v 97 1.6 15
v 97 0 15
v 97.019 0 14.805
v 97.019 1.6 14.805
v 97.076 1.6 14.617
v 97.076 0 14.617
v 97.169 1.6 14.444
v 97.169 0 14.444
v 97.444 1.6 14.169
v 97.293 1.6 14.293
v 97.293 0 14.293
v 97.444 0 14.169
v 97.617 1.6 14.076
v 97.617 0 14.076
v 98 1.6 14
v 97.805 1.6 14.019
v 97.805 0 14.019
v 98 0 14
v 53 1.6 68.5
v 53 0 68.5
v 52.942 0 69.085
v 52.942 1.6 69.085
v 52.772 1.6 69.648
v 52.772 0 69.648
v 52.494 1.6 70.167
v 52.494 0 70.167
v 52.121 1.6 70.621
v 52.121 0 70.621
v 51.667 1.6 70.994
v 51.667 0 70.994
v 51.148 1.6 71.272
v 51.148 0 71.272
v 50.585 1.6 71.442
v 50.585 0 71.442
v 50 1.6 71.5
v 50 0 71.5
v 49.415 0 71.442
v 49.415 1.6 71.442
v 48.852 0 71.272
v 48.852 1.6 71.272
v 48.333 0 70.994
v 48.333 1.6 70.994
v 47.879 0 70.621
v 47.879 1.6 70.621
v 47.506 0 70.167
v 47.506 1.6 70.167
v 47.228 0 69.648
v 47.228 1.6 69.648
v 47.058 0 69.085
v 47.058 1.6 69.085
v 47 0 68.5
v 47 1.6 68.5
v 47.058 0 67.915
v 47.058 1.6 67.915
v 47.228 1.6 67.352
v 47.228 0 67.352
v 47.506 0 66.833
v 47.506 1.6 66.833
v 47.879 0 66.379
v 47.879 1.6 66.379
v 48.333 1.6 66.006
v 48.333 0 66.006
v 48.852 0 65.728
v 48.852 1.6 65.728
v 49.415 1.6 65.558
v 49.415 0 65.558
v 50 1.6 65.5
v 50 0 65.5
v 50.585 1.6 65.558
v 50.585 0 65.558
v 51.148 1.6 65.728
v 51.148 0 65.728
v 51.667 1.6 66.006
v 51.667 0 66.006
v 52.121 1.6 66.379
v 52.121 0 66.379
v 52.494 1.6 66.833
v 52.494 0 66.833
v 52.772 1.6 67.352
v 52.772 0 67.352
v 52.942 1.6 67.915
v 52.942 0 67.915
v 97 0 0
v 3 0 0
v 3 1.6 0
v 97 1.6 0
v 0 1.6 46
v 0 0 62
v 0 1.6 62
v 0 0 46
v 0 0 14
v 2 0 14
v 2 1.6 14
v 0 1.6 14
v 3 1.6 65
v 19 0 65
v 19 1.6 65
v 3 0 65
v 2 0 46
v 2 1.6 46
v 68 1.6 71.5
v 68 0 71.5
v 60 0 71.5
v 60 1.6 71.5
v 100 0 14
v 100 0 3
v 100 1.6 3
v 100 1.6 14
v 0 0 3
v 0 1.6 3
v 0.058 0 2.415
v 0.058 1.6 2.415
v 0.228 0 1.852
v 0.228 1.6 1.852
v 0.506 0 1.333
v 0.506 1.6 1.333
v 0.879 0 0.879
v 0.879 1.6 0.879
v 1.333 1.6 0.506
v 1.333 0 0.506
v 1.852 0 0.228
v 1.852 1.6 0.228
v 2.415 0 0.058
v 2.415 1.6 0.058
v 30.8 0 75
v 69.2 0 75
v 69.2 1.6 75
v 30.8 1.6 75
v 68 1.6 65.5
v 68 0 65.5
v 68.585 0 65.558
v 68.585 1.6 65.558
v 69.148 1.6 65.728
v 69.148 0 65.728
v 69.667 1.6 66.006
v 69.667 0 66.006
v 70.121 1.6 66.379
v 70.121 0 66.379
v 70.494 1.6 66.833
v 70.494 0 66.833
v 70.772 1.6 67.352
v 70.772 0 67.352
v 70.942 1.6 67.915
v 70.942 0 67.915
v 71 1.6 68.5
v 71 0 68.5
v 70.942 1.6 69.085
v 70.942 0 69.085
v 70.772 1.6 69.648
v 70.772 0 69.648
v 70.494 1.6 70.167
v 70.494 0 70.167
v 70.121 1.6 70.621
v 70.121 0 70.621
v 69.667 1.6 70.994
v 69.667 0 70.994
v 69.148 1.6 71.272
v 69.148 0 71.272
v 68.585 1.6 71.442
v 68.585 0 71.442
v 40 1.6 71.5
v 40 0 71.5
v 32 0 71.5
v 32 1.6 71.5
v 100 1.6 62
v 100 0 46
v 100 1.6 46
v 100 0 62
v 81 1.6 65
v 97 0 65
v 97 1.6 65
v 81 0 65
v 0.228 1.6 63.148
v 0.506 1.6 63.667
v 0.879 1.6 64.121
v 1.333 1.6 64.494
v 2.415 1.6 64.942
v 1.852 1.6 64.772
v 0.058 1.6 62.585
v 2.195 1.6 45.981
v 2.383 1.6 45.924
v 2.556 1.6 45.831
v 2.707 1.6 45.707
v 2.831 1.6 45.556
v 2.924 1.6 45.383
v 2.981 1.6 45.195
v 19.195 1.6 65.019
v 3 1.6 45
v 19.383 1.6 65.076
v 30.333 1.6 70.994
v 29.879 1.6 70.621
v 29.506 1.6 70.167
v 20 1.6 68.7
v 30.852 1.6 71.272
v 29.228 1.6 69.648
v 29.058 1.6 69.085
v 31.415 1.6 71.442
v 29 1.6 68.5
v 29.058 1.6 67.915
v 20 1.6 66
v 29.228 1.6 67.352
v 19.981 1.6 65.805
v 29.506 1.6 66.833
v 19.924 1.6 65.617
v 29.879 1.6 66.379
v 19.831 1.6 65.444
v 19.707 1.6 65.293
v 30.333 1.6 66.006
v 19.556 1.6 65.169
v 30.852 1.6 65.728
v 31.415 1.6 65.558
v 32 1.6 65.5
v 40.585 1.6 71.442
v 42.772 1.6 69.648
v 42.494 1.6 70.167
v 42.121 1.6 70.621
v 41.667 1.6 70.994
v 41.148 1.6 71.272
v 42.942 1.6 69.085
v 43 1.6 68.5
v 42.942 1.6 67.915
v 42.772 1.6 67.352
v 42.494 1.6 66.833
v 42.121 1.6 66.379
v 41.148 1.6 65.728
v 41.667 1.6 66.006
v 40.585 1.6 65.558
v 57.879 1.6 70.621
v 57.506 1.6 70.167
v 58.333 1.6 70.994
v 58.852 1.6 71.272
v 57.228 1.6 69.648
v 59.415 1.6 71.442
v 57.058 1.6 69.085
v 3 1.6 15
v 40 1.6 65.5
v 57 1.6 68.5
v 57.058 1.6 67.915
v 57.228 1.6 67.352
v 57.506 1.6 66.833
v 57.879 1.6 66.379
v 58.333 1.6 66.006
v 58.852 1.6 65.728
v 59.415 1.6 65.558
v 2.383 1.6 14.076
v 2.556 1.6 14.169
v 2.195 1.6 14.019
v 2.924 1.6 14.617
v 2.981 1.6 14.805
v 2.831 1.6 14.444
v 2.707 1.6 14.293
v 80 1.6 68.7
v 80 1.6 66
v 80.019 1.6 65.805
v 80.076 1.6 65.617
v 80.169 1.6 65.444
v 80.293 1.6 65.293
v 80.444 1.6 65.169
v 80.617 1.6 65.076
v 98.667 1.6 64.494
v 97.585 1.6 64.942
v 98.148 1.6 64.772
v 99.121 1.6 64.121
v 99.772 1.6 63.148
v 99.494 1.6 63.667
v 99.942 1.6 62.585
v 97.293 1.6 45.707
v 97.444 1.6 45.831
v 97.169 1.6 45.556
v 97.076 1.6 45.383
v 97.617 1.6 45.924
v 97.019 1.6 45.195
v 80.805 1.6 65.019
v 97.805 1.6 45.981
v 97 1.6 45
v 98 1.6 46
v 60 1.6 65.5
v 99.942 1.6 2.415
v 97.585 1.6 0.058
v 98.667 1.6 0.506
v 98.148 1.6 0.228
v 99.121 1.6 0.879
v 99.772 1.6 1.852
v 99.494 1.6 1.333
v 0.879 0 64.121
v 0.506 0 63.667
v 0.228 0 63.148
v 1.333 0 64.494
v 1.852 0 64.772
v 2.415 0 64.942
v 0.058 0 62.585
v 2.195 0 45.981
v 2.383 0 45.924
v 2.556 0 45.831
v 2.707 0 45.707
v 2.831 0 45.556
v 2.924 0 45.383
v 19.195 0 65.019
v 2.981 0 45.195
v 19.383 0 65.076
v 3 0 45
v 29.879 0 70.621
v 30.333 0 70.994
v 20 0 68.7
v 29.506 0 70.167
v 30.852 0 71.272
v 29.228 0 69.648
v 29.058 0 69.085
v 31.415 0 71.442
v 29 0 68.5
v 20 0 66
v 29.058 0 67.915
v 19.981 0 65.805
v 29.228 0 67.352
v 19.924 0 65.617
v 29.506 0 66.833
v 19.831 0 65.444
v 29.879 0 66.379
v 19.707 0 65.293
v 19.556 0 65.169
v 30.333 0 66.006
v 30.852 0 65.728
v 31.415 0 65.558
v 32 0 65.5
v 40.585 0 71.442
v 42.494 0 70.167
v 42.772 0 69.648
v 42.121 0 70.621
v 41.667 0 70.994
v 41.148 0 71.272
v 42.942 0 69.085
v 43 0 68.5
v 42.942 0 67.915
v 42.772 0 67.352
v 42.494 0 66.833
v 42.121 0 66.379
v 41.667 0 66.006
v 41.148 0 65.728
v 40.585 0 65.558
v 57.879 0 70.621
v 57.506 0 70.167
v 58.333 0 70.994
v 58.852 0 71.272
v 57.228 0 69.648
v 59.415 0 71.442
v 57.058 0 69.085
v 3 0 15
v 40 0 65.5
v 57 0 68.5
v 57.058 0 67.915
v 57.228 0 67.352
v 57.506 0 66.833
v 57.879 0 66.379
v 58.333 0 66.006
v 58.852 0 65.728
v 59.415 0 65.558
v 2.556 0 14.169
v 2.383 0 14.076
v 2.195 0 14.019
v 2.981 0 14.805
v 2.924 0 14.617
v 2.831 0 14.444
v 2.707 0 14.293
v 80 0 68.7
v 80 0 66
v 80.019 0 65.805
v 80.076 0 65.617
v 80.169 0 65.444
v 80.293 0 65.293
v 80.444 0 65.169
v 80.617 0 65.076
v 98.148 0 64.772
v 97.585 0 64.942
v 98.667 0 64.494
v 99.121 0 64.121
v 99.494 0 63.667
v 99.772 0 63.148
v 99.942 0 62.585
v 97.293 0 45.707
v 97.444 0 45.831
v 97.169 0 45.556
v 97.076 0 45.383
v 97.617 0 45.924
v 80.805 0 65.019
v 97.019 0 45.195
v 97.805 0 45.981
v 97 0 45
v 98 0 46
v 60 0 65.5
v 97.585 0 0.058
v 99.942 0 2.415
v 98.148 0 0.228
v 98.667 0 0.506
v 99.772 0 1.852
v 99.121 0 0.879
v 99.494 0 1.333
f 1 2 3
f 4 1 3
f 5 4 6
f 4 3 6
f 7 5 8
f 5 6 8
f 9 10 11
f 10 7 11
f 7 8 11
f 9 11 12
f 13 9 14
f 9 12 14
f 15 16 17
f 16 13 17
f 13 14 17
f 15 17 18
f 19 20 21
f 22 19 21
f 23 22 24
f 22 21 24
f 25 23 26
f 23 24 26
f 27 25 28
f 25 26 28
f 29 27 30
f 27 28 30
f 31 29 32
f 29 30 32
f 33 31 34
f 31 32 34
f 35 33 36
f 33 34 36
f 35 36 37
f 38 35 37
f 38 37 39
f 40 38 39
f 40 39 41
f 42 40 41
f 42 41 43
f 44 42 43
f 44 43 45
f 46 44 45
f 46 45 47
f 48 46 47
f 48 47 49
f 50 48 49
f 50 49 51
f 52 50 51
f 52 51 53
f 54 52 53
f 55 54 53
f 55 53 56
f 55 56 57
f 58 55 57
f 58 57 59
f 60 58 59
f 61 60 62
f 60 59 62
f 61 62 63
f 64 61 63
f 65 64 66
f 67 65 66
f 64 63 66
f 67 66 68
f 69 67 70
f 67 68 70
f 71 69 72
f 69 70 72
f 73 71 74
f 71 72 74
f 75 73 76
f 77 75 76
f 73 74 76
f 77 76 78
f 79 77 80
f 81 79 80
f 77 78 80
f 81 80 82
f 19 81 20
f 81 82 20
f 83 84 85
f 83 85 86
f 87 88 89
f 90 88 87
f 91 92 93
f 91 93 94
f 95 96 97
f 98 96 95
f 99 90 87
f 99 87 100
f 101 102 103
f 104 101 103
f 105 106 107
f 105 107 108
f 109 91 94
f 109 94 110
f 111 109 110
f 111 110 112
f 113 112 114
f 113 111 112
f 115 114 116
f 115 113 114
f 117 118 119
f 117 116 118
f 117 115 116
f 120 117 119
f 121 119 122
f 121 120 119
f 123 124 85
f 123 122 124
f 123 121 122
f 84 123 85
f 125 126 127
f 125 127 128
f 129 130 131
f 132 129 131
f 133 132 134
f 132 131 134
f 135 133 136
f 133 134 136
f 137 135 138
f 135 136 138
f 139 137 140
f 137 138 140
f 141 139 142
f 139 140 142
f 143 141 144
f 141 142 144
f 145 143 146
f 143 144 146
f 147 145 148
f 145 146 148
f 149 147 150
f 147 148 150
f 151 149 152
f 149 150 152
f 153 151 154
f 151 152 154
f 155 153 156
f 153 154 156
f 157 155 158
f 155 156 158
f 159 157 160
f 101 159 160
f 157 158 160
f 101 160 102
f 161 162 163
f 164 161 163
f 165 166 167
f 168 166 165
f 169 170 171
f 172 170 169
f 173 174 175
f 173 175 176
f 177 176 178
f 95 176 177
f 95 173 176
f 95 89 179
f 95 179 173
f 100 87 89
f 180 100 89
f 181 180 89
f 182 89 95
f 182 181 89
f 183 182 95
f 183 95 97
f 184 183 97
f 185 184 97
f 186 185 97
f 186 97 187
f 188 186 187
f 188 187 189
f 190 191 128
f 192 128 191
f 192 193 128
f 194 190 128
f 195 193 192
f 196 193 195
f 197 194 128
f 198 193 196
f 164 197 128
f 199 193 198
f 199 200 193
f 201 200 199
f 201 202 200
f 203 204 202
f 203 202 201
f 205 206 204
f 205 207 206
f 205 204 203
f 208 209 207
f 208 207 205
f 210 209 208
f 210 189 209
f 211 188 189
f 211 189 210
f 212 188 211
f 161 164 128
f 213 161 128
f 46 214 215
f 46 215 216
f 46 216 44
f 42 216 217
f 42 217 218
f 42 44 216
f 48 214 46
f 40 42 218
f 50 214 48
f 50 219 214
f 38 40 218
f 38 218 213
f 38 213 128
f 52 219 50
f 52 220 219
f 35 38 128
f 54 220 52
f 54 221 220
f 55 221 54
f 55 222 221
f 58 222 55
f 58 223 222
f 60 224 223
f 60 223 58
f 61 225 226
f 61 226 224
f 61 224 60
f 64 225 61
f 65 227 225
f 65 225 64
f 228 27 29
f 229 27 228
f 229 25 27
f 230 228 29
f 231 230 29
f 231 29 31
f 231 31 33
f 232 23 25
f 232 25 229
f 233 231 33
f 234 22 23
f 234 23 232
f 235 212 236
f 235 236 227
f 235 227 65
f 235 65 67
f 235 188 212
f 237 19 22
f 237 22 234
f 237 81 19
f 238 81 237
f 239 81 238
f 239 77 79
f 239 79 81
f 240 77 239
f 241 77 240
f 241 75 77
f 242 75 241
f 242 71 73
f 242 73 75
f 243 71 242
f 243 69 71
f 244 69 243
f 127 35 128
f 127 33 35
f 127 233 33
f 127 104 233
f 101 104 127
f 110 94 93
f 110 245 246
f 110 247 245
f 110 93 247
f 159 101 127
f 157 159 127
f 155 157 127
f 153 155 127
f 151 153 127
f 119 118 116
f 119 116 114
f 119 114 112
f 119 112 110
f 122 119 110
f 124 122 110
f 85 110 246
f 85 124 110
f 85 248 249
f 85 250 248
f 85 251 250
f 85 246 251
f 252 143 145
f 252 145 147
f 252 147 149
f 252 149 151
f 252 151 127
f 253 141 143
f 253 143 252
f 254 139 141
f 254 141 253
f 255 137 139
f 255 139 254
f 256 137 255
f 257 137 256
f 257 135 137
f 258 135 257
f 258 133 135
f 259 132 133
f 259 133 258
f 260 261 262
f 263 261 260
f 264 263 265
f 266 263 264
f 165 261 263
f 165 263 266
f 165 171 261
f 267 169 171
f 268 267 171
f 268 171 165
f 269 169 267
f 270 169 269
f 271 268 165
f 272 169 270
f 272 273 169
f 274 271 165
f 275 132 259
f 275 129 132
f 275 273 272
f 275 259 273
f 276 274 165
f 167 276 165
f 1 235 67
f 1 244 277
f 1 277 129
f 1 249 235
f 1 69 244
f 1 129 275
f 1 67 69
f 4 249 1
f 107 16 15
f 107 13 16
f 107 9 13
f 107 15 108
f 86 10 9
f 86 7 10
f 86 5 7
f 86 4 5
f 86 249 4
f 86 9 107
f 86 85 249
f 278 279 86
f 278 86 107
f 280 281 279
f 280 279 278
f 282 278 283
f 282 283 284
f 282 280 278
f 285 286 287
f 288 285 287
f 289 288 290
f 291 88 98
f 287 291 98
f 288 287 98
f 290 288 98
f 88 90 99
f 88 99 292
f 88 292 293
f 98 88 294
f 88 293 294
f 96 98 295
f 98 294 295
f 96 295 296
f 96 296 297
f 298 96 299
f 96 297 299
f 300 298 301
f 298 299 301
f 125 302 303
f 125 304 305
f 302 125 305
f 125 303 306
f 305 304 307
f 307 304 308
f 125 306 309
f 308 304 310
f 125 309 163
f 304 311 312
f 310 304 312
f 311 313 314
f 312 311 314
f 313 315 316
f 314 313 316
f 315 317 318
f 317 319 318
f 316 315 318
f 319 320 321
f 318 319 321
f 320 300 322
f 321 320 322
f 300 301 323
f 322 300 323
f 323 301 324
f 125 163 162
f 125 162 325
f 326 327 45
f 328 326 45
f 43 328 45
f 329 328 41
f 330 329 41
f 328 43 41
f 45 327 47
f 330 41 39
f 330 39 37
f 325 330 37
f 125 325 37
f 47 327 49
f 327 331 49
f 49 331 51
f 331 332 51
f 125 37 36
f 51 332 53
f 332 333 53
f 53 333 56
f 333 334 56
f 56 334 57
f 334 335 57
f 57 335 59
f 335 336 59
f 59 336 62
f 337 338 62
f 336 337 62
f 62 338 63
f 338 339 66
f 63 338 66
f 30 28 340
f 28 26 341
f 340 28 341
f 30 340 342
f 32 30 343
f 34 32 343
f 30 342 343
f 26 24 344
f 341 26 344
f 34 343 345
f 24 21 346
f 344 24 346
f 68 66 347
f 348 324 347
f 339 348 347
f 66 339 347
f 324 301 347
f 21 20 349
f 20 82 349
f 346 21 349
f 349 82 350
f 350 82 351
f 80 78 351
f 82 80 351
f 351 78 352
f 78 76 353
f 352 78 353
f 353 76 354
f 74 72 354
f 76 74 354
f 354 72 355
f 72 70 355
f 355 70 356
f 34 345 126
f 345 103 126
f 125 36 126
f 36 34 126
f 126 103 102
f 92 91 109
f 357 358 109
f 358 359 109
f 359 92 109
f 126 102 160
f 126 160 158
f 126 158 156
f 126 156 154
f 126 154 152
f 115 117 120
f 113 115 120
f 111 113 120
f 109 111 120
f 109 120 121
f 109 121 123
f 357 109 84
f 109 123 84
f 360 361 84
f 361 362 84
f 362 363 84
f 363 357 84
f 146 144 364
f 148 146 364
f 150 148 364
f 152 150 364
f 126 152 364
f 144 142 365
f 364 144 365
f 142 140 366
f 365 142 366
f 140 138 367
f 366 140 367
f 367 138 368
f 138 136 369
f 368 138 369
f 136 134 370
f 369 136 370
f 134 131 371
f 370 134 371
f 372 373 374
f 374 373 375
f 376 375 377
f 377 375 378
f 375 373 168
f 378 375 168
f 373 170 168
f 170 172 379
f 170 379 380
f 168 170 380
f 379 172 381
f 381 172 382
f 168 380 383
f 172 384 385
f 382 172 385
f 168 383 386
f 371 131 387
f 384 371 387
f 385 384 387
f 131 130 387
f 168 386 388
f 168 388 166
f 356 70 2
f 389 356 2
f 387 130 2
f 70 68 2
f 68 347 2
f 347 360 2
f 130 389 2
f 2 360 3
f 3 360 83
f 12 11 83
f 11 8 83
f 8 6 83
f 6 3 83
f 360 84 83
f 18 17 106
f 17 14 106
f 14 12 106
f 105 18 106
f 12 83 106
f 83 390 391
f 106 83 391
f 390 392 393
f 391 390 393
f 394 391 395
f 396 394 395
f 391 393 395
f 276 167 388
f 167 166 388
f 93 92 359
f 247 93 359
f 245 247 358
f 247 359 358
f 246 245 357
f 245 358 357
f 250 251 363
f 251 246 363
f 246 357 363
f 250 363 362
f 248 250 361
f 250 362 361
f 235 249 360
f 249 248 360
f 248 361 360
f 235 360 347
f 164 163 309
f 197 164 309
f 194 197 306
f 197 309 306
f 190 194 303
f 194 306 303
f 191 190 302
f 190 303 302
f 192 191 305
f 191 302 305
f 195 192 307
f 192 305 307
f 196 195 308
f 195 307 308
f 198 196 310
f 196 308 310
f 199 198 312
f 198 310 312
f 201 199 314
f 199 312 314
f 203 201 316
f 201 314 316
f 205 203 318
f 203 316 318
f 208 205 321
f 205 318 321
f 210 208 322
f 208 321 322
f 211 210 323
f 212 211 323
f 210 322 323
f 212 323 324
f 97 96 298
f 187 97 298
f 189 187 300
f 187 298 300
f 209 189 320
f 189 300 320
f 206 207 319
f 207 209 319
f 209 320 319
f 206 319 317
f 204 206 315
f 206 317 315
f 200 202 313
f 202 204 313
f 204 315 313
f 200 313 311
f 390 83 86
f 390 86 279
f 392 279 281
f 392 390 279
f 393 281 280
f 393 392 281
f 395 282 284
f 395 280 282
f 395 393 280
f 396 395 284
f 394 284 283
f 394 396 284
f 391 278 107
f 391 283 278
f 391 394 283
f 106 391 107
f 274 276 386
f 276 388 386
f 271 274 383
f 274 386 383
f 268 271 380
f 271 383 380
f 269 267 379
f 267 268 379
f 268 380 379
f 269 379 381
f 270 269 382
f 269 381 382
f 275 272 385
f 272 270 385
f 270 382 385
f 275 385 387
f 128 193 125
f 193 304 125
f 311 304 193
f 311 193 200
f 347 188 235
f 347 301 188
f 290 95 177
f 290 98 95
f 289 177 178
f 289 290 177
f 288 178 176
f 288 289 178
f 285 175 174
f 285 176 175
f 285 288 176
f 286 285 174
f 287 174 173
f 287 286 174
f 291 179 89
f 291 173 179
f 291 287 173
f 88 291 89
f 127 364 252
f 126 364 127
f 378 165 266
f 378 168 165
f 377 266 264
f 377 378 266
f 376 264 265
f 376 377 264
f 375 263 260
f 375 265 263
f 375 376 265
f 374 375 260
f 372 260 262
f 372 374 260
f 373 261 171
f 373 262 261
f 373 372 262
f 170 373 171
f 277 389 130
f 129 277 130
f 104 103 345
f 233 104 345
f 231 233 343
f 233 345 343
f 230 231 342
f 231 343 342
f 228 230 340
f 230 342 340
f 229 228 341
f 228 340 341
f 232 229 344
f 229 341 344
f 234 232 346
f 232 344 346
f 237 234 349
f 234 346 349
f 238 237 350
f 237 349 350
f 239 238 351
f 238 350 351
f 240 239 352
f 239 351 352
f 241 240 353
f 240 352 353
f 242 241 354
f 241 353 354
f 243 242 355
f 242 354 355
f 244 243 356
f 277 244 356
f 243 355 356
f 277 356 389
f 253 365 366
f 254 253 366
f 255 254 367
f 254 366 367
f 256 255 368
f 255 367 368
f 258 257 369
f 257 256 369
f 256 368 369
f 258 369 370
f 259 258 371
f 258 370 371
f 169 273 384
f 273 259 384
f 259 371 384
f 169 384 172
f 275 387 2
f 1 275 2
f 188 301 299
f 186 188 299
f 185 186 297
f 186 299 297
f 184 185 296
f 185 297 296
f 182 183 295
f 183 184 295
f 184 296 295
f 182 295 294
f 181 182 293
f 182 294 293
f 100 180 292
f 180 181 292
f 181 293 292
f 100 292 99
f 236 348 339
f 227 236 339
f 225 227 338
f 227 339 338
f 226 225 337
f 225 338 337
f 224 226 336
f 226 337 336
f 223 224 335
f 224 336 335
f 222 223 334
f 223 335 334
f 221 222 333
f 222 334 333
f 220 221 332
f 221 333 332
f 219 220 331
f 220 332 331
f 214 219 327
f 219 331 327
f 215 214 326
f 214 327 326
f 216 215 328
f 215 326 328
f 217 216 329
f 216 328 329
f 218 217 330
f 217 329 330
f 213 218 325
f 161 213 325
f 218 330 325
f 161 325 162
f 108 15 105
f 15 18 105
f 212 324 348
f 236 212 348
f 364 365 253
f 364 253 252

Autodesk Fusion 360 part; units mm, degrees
sketch "Skizze5" plane through (0, 0, 0) normal (0, 1, 0) x (1, 0, 0)
  line L0 (3, 0) -> (97, 0)
  line L1 (80, -66) -> (80, -68.7)
  line L2 (69.2, -75) -> (30.8, -75)
  line L3 (20, -68.7) -> (20, -66)
  line L4 (97, -65) -> (81, -65)
  line L5 (19, -65) -> (3, -65)
  line L6 (20, -68.7) -> (30.8, -75)
  line L7 (80, -68.7) -> (69.2, -75)
  arc A0 (20, -66) -> (19, -65) centre (19, -66) ccw
  arc A1 (81, -65) -> (80, -66) centre (81, -66) ccw
  arc A2 (0, -62) -> (3, -65) centre (3, -62) ccw
  arc A3 (97, -65) -> (100, -62) centre (97, -62) ccw
  arc A4 (100, -3) -> (97, 0) centre (97, -3) ccw
  arc A5 (3, 0) -> (0, -3) centre (3, -3) ccw
  line L8 (0, -46) -> (2, -46)
  line L9 (3, -45) -> (3, -15)
  line L10 (2, -14) -> (0, -14)
  line L11 (0, -62) -> (0, -46)
  line L12 (0, -14) -> (0, -3)
  arc A6 (2, -46) -> (3, -45) centre (2, -45) ccw
  arc A7 (3, -15) -> (2, -14) centre (2, -15) ccw
  line L13 (100, -46) -> (98, -46)
  line L14 (97, -45) -> (97, -15)
  line L15 (98, -14) -> (100, -14)
  line L16 (100, -3) -> (100, -14)
  line L17 (100, -46) -> (100, -62)
  arc A8 (97, -45) -> (98, -46) centre (98, -45) ccw
  arc A9 (98, -14) -> (97, -15) centre (98, -15) ccw
  point P0 (100, 0)
  point P1 (0, -65)
  point P2 (20, -65)
  point P3 (80, -65)
  point P4 (3, -46)
  point P5 (3, -14)
  point P6 (97, -46)
  point P7 (97, -14)
  dimension "d46" = 100
  dimension "d47" = 65
  dimension "d48" = 20
  dimension "d49" = 20
  dimension "d51" = 3.7
  dimension "d52" = 3.7
  dimension "d53" = 10.8
  dimension "d54" = 10.8
  dimension "d55" = 10
  dimension "d56" = 1
  dimension "d57" = 1
  dimension "d58" = 3
  dimension "d59" = 3
  dimension "d60" = 3
  dimension "d61" = 3
  dimension "d62" = 3
  dimension "d63" = 32
  dimension "d64" = 14
  dimension "d65" = 1
  dimension "d66" = 1
  dimension "d67" = 32
  dimension "d68" = 14
  dimension "d69" = 3
  dimension "d70" = 1
  dimension "d71" = 1
extrude "Extrusion1" add sketch "Skizze5" along normal blind 1.6
sketch "Skizze6" plane through (0, 0, 0) normal (0, -1, 0) x (1, 0, 0)
  arc A0 (97, 0) -> (100, 3) centre (97, 3) ccw
  line L0 (100, 3) -> (100, 14)
  line L1 (100, 14) -> (98, 14)
  arc A1 (97, 15) -> (98, 14) centre (98, 15) ccw
  line L2 (97, 15) -> (97, 45)
  arc A2 (98, 46) -> (97, 45) centre (98, 45) ccw
  line L3 (98, 46) -> (100, 46)
  line L4 (100, 46) -> (100, 62)
  arc A3 (100, 62) -> (97, 65) centre (97, 62) ccw
  line L5 (97, 65) -> (81, 65)
  arc A4 (80, 66) -> (81, 65) centre (81, 66) ccw
  line L6 (80, 66) -> (80, 68.7)
  line L7 (80, 68.7) -> (69.2, 75)
  line L8 (69.2, 75) -> (30.8, 75)
  line L9 (30.8, 75) -> (20, 68.7)
  line L10 (20, 68.7) -> (20, 66)
  arc A5 (19, 65) -> (20, 66) centre (19, 66) ccw
  line L11 (19, 65) -> (3, 65)
  arc A6 (3, 65) -> (0, 62) centre (3, 62) ccw
  line L12 (0, 62) -> (0, 46)
  line L13 (0, 46) -> (2, 46)
  arc A7 (3, 45) -> (2, 46) centre (2, 45) ccw
  line L14 (3, 45) -> (3, 15)
  arc A8 (2, 14) -> (3, 15) centre (2, 15) ccw
  line L15 (2, 14) -> (0, 14)
  line L16 (0, 14) -> (0, 3)
  arc A9 (0, 3) -> (3, 0) centre (3, 3) ccw
  line L17 (3, 0) -> (97, 0)
  circle A10 centre (50, 68.5) radius 3
  line L18 (32, 65.5) -> (40, 65.5)
  arc A11 (40, 65.5) -> (40, 71.5) centre (40, 68.5) ccw
  line L19 (40, 71.5) -> (32, 71.5)
  arc A12 (32, 71.5) -> (32, 65.5) centre (32, 68.5) ccw
  line L20 (32, 68.5) -> (40, 68.5) construction
  line L21 (68, 71.5) -> (60, 71.5)
  arc A13 (60, 71.5) -> (60, 65.5) centre (60, 68.5) ccw
  line L22 (60, 65.5) -> (68, 65.5)
  arc A14 (68, 65.5) -> (68, 71.5) centre (68, 68.5) ccw
  line L23 (68, 68.5) -> (60, 68.5) construction
  point P0 (36, 68.5)
  point P1 (64, 68.5)
  dimension "d77" = 50
  dimension "d78" = 68.5
  dimension "d79" = 6
  dimension "d88" = 8
  dimension "d89" = 8
  dimension "d90" = 6
  dimension "d91" = 6
  dimension "d92" = 68.5
  dimension "d93" = 68.5
  dimension "d94" = 36
  dimension "d95" = 36
extrude "Extrusion5" cut sketch "Skizze6" against normal blind 1.6 contours A10 | L18 A11 L19 A12 | L21 A13 L22 A14
